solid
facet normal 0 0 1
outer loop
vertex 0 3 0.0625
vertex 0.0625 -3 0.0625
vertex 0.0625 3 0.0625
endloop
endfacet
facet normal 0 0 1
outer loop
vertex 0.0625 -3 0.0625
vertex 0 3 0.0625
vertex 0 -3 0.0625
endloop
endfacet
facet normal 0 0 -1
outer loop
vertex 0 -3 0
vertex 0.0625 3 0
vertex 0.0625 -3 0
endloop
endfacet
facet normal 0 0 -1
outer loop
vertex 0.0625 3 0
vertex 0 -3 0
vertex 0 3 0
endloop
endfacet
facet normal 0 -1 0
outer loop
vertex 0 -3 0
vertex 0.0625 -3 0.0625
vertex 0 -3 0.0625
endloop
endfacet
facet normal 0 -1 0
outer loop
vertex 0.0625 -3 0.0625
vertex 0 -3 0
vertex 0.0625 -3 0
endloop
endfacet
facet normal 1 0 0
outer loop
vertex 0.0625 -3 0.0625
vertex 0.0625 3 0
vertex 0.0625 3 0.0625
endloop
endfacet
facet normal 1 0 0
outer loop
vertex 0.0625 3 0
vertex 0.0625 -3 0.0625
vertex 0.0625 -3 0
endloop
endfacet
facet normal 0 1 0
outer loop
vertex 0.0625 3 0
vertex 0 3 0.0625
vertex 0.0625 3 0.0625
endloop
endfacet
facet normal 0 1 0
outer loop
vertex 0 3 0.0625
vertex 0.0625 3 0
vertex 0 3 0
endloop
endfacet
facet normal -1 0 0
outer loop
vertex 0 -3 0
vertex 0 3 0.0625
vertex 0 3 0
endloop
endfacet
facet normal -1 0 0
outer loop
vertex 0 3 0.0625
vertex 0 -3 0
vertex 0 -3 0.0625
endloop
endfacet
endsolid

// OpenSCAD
//####################################
// square_spar.scad
// (c) 2021 by Roie R. Black
//====================================


module square_spar(length=6,size=1/16) {
  translate([size/2, 0, size/2])
    cube([size,length,size], center=true);
}

square_spar(6,1/16);
